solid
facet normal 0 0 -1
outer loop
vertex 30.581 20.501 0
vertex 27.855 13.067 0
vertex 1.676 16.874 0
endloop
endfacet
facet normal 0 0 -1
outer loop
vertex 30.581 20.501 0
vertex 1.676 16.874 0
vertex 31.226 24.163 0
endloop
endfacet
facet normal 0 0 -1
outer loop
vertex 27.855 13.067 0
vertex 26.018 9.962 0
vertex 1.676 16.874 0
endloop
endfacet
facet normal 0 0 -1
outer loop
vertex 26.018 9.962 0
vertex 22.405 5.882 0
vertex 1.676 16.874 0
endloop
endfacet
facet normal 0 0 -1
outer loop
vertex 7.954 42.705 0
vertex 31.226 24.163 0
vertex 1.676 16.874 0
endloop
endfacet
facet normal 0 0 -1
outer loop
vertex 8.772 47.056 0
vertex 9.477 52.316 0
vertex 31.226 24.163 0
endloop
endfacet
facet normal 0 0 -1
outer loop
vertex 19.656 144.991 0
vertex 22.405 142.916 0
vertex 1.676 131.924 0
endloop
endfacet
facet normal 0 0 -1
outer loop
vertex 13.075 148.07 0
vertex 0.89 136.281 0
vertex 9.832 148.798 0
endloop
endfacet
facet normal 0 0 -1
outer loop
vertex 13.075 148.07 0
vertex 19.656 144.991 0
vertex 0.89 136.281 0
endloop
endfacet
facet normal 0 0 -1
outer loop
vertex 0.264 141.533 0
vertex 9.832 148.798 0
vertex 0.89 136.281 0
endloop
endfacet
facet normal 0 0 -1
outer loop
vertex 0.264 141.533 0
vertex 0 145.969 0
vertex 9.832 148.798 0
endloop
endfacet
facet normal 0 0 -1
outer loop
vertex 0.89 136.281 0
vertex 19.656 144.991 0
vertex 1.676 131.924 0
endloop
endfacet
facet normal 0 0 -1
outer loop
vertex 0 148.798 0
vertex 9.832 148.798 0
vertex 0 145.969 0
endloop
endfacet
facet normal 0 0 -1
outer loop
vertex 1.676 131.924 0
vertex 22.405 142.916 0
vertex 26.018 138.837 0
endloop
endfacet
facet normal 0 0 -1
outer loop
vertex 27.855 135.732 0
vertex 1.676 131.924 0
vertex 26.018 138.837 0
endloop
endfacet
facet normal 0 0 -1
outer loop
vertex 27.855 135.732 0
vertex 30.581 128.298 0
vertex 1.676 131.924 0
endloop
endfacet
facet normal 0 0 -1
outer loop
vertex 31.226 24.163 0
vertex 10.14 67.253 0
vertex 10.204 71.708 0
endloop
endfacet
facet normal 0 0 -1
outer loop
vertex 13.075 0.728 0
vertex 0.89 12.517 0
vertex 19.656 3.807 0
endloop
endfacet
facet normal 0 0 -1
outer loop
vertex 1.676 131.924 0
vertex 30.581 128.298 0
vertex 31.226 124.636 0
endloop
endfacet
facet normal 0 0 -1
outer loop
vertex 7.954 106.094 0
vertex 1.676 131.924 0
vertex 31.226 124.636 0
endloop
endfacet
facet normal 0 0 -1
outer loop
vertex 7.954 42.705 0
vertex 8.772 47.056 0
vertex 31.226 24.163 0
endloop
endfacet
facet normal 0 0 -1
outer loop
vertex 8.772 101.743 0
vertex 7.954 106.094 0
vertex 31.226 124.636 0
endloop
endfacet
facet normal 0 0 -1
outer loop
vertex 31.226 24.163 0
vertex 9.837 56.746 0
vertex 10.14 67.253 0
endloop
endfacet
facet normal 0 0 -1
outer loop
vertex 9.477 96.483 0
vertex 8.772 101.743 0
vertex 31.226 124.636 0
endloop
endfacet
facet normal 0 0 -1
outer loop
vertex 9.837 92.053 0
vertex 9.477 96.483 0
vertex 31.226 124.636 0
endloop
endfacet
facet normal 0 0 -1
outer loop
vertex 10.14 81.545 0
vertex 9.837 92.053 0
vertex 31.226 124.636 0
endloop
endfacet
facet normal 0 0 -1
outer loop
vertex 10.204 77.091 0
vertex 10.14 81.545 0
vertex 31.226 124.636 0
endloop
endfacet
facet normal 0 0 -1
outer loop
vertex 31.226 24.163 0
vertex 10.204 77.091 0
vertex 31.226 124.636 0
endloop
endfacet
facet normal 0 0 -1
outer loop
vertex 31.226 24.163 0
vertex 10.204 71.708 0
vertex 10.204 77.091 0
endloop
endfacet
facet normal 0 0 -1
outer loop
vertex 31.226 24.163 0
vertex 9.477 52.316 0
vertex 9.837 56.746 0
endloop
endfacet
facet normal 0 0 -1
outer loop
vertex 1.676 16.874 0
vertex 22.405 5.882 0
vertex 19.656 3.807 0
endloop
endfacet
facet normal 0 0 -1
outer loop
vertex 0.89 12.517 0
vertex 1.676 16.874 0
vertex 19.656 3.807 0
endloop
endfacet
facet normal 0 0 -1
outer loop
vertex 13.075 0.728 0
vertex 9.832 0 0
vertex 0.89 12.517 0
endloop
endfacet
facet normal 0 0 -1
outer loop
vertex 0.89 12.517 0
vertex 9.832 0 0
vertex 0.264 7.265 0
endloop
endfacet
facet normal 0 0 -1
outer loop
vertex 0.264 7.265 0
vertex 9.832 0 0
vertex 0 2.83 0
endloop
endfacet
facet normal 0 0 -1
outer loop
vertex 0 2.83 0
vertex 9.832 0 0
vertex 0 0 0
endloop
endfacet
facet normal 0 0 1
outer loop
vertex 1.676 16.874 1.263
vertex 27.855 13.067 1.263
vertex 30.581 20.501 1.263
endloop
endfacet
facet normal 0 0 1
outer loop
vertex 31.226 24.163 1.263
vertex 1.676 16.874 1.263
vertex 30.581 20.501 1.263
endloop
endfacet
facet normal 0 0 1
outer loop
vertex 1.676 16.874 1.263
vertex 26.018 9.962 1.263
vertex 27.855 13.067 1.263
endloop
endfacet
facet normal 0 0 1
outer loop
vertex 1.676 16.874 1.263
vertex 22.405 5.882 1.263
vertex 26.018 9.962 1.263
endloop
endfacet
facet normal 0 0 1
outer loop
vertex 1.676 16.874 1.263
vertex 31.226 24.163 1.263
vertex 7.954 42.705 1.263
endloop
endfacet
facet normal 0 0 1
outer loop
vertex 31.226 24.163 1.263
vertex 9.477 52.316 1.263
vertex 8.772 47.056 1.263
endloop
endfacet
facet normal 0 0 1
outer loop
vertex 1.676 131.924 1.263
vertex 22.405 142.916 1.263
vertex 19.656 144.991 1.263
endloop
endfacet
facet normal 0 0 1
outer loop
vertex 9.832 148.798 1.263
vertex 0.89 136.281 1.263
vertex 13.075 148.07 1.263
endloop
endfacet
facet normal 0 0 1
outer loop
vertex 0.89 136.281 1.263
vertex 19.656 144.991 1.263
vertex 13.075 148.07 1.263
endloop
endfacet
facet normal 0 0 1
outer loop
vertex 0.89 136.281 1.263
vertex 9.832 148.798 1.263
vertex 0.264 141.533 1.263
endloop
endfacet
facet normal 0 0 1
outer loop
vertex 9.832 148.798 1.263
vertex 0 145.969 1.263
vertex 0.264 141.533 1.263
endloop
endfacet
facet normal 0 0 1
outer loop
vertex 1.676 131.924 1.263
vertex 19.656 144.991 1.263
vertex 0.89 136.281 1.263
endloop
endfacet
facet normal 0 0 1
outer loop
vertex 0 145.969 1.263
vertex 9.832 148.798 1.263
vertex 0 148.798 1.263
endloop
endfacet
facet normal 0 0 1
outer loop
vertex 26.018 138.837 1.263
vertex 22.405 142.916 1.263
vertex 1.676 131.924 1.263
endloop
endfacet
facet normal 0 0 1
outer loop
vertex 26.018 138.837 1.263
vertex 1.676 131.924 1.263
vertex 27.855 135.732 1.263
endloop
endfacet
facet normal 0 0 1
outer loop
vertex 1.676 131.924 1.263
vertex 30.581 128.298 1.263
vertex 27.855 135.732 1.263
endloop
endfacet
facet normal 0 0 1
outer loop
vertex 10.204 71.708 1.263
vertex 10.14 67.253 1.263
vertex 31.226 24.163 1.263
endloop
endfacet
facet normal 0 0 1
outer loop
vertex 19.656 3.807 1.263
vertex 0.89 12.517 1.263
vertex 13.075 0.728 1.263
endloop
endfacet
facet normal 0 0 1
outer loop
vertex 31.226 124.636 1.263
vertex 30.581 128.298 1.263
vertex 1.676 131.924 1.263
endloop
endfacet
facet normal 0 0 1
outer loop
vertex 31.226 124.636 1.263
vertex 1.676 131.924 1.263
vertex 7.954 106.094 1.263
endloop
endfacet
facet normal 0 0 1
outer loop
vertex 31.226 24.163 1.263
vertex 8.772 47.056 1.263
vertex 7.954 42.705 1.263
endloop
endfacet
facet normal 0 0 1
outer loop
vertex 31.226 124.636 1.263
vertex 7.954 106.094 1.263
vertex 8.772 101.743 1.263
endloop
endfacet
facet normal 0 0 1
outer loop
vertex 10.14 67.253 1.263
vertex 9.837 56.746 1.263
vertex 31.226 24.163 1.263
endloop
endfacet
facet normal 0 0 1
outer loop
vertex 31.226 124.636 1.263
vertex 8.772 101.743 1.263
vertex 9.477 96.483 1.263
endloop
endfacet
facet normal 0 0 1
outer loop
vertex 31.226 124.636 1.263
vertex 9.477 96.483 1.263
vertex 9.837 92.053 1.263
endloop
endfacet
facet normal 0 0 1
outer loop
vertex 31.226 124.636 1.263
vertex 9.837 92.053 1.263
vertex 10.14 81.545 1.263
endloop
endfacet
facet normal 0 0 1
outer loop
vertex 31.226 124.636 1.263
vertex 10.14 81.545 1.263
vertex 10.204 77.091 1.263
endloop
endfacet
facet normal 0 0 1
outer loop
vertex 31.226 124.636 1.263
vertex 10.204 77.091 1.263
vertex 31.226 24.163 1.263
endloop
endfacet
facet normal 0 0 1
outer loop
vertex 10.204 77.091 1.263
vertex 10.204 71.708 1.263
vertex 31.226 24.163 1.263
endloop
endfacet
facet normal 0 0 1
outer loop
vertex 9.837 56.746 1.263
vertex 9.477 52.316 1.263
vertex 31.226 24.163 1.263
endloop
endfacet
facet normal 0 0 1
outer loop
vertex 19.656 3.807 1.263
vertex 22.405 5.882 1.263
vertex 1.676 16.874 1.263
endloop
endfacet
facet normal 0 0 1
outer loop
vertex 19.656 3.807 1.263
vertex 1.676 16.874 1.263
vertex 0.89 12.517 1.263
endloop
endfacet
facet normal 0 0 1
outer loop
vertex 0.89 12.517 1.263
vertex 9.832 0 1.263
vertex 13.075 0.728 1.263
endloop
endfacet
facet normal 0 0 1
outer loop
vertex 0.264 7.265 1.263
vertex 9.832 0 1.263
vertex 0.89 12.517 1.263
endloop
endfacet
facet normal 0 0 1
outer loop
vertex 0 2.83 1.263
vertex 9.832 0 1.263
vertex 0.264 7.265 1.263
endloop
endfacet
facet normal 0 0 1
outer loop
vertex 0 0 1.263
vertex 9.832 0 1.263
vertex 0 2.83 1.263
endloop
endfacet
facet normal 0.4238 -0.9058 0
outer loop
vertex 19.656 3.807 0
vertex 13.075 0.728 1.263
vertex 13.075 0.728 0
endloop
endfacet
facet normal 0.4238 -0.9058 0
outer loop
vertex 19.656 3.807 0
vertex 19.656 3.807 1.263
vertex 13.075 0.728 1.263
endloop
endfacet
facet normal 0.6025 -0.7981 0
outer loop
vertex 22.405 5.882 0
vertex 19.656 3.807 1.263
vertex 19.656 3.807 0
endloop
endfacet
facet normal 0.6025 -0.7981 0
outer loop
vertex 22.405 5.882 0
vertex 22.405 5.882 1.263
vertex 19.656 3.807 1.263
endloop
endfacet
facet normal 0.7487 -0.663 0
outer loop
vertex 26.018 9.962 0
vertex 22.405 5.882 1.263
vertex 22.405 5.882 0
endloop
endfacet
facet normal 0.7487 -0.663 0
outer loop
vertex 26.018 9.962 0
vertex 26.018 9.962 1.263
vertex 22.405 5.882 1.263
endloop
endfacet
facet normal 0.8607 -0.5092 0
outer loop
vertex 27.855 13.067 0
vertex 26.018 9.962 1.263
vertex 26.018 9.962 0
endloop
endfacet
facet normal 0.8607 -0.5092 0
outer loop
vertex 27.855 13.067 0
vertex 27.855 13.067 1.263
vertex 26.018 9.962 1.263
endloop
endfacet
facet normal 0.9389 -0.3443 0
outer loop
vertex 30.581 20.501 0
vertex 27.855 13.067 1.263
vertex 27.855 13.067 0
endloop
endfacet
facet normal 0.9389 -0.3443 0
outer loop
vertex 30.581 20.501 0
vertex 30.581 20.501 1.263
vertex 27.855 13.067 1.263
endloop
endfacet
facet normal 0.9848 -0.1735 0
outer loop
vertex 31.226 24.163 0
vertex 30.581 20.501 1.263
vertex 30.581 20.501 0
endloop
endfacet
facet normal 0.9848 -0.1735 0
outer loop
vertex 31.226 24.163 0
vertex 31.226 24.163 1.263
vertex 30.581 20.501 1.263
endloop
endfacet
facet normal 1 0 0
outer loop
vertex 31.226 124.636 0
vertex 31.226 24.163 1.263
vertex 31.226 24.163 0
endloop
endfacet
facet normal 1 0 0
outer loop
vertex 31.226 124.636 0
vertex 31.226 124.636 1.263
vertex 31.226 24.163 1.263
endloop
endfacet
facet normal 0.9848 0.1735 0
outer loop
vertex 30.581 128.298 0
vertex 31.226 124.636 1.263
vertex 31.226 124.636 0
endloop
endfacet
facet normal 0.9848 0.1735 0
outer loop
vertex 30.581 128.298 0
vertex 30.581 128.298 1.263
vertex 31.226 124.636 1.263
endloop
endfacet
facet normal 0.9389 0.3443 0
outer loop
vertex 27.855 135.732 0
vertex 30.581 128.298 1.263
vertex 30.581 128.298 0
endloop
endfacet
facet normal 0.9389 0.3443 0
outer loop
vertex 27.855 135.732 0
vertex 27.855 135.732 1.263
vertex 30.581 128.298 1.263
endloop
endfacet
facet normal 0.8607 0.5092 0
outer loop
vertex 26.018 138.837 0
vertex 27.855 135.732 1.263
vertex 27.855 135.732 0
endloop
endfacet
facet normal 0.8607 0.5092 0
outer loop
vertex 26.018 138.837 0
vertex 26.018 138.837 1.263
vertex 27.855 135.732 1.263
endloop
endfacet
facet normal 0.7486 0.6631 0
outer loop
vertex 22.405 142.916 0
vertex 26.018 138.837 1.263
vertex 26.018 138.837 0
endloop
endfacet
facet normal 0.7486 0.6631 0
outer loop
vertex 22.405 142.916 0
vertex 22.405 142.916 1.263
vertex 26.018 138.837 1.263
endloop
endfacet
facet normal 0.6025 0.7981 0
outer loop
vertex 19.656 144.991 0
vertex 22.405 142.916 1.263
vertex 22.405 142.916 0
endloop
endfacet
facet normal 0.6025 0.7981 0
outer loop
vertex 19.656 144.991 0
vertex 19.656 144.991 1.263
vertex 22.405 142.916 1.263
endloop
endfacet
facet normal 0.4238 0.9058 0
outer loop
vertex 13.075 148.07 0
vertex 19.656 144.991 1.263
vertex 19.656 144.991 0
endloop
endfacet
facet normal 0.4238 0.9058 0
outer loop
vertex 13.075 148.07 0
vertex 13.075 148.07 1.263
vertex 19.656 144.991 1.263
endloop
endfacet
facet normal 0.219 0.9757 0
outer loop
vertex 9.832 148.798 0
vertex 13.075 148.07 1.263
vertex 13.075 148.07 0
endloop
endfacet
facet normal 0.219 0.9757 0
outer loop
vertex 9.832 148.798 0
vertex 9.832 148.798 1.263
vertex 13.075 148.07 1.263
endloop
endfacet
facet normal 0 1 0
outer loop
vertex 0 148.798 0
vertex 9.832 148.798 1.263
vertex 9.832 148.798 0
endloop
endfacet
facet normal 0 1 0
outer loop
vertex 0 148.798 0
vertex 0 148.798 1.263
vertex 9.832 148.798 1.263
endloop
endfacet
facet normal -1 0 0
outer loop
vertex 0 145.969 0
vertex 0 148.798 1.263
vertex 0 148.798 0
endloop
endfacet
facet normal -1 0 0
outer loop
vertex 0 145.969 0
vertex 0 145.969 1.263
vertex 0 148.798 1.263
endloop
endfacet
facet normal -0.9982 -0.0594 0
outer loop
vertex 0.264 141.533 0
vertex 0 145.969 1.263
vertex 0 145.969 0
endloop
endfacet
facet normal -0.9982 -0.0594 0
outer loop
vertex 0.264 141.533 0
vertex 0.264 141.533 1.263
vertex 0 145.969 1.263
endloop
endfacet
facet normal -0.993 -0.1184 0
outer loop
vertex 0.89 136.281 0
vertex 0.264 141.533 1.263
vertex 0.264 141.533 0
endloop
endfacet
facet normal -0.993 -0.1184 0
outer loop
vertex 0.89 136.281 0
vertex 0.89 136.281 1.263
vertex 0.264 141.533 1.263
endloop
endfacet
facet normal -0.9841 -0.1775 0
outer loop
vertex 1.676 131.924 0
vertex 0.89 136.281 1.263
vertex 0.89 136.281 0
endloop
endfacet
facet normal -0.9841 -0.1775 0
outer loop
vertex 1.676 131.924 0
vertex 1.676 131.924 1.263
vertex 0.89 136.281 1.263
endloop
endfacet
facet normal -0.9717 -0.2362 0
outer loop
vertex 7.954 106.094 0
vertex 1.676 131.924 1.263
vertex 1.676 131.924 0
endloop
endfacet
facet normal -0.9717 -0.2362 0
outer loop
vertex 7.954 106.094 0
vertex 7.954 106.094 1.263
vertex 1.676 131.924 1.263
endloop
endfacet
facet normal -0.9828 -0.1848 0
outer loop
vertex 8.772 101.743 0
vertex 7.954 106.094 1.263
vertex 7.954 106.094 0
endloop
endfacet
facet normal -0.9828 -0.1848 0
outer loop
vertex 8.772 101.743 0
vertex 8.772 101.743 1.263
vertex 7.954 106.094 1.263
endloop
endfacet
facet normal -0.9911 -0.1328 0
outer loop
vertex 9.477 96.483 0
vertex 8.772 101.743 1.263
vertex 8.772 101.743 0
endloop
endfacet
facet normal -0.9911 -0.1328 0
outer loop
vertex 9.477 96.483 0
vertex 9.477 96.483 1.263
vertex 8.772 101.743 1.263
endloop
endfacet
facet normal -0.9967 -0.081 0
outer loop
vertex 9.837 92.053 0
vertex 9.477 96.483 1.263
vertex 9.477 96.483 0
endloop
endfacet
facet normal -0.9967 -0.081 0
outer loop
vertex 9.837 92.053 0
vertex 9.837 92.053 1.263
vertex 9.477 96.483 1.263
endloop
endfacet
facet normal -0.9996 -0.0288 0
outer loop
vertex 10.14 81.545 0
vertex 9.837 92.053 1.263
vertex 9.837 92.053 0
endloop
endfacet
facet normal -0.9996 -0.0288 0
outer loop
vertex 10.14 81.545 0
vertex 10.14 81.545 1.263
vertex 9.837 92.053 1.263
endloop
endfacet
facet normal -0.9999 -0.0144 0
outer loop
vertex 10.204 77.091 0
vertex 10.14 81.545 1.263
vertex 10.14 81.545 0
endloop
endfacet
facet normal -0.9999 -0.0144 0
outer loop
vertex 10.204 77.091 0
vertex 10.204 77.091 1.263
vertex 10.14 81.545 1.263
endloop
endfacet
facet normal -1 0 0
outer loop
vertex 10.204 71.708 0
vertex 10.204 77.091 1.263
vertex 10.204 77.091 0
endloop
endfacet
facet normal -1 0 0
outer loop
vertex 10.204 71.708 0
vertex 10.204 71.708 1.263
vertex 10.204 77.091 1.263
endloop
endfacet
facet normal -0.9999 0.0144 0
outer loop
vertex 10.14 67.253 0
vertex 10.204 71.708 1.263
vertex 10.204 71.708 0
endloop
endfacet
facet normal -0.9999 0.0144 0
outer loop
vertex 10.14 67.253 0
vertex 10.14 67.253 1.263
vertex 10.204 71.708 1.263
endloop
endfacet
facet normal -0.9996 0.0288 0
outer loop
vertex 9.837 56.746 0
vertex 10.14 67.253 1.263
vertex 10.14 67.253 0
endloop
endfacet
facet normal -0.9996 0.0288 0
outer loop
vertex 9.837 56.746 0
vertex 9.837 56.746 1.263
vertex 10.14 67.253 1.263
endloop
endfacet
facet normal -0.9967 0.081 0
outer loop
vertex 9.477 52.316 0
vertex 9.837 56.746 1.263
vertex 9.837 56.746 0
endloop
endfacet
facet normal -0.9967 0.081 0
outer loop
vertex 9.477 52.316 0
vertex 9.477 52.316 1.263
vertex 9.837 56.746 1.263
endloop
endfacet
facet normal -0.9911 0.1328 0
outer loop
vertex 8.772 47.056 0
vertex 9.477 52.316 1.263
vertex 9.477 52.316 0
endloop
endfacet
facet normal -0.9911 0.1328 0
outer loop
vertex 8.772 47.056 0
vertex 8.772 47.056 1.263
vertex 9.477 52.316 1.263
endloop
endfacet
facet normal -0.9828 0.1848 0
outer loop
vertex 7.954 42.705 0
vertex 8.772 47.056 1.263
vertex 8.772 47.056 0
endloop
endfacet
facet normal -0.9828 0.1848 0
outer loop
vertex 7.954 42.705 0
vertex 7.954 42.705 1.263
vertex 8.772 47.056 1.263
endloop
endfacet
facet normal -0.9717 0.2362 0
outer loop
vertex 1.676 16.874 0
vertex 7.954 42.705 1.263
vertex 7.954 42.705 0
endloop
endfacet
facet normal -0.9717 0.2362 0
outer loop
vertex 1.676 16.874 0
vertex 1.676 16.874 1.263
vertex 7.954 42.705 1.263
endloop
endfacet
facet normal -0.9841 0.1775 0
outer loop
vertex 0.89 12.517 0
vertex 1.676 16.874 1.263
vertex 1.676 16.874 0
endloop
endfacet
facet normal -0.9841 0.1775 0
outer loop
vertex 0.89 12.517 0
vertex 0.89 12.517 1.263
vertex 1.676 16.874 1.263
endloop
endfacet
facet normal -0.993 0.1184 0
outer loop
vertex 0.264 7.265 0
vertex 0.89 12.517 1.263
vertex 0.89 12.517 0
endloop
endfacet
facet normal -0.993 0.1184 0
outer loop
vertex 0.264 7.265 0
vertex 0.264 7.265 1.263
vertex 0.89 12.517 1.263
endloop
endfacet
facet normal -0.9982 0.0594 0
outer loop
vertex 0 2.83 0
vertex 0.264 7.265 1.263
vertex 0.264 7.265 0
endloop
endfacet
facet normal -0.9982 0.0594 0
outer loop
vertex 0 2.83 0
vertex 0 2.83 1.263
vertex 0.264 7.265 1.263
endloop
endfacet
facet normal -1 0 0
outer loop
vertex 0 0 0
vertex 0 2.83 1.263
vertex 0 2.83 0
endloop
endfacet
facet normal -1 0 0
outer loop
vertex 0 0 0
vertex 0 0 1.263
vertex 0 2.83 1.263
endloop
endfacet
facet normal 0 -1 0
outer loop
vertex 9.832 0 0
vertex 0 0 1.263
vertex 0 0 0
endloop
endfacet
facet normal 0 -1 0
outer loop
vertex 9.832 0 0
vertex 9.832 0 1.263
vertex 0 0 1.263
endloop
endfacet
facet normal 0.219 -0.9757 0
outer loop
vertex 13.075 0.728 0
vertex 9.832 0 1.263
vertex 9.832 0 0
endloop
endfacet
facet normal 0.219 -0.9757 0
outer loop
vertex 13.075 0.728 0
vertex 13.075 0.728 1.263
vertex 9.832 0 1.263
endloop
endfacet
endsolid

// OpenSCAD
// oyl_trim_strip.scad — curved trim strip (part02, exact recreation)
// A perfectly planar 1.263 mm sheet; outline traced from the original mesh
// (43 points). Local frame: sheet lies in the XY plane, thickness in +Z
// (print it flat, as-is). Original orientation had thickness along Y.

thickness = 1.2631;
xy_scale  = 1.0;   // uniform in-plane scale if you ever need to resize

outline = [
    [0.0000, 2.8297], [0.2640, 7.2654], [0.8901, 12.5172], [1.6758, 16.8738],
    [7.9545, 42.7047], [8.7719, 47.0564], [9.4768, 52.3160], [9.8369, 56.7460],
    [10.1397, 67.2531], [10.2042, 71.7083], [10.2042, 77.0908], [10.1397, 81.5453],
    [9.8369, 92.0531], [9.4768, 96.4831], [8.7719, 101.7427], [7.9545, 106.0936],
    [1.6758, 131.9245], [0.8901, 136.2812], [0.2640, 141.5329], [0.0000, 145.9694],
    [0.0000, 148.7984], [9.8318, 148.7984], [13.0750, 148.0701], [19.6564, 144.9910],
    [22.4055, 142.9161], [26.0180, 138.8370], [27.8554, 135.7319], [30.5809, 128.2983],
    [31.2264, 124.6361], [31.2264, 123.9991], [31.2264, 99.1992], [31.2264, 74.3992],
    [31.2264, 49.5992], [31.2264, 24.8000], [31.2264, 24.1630], [30.5809, 20.5008],
    [27.8554, 13.0671], [26.0180, 9.9621], [22.4055, 5.8822], [19.6564, 3.8074],
    [13.0750, 0.7283], [9.8318, 0.0000], [0.0000, 0.0000]
];

module trim_strip() {
    linear_extrude(height = thickness)
        scale([xy_scale, xy_scale])
            polygon(outline);
}

trim_strip();
